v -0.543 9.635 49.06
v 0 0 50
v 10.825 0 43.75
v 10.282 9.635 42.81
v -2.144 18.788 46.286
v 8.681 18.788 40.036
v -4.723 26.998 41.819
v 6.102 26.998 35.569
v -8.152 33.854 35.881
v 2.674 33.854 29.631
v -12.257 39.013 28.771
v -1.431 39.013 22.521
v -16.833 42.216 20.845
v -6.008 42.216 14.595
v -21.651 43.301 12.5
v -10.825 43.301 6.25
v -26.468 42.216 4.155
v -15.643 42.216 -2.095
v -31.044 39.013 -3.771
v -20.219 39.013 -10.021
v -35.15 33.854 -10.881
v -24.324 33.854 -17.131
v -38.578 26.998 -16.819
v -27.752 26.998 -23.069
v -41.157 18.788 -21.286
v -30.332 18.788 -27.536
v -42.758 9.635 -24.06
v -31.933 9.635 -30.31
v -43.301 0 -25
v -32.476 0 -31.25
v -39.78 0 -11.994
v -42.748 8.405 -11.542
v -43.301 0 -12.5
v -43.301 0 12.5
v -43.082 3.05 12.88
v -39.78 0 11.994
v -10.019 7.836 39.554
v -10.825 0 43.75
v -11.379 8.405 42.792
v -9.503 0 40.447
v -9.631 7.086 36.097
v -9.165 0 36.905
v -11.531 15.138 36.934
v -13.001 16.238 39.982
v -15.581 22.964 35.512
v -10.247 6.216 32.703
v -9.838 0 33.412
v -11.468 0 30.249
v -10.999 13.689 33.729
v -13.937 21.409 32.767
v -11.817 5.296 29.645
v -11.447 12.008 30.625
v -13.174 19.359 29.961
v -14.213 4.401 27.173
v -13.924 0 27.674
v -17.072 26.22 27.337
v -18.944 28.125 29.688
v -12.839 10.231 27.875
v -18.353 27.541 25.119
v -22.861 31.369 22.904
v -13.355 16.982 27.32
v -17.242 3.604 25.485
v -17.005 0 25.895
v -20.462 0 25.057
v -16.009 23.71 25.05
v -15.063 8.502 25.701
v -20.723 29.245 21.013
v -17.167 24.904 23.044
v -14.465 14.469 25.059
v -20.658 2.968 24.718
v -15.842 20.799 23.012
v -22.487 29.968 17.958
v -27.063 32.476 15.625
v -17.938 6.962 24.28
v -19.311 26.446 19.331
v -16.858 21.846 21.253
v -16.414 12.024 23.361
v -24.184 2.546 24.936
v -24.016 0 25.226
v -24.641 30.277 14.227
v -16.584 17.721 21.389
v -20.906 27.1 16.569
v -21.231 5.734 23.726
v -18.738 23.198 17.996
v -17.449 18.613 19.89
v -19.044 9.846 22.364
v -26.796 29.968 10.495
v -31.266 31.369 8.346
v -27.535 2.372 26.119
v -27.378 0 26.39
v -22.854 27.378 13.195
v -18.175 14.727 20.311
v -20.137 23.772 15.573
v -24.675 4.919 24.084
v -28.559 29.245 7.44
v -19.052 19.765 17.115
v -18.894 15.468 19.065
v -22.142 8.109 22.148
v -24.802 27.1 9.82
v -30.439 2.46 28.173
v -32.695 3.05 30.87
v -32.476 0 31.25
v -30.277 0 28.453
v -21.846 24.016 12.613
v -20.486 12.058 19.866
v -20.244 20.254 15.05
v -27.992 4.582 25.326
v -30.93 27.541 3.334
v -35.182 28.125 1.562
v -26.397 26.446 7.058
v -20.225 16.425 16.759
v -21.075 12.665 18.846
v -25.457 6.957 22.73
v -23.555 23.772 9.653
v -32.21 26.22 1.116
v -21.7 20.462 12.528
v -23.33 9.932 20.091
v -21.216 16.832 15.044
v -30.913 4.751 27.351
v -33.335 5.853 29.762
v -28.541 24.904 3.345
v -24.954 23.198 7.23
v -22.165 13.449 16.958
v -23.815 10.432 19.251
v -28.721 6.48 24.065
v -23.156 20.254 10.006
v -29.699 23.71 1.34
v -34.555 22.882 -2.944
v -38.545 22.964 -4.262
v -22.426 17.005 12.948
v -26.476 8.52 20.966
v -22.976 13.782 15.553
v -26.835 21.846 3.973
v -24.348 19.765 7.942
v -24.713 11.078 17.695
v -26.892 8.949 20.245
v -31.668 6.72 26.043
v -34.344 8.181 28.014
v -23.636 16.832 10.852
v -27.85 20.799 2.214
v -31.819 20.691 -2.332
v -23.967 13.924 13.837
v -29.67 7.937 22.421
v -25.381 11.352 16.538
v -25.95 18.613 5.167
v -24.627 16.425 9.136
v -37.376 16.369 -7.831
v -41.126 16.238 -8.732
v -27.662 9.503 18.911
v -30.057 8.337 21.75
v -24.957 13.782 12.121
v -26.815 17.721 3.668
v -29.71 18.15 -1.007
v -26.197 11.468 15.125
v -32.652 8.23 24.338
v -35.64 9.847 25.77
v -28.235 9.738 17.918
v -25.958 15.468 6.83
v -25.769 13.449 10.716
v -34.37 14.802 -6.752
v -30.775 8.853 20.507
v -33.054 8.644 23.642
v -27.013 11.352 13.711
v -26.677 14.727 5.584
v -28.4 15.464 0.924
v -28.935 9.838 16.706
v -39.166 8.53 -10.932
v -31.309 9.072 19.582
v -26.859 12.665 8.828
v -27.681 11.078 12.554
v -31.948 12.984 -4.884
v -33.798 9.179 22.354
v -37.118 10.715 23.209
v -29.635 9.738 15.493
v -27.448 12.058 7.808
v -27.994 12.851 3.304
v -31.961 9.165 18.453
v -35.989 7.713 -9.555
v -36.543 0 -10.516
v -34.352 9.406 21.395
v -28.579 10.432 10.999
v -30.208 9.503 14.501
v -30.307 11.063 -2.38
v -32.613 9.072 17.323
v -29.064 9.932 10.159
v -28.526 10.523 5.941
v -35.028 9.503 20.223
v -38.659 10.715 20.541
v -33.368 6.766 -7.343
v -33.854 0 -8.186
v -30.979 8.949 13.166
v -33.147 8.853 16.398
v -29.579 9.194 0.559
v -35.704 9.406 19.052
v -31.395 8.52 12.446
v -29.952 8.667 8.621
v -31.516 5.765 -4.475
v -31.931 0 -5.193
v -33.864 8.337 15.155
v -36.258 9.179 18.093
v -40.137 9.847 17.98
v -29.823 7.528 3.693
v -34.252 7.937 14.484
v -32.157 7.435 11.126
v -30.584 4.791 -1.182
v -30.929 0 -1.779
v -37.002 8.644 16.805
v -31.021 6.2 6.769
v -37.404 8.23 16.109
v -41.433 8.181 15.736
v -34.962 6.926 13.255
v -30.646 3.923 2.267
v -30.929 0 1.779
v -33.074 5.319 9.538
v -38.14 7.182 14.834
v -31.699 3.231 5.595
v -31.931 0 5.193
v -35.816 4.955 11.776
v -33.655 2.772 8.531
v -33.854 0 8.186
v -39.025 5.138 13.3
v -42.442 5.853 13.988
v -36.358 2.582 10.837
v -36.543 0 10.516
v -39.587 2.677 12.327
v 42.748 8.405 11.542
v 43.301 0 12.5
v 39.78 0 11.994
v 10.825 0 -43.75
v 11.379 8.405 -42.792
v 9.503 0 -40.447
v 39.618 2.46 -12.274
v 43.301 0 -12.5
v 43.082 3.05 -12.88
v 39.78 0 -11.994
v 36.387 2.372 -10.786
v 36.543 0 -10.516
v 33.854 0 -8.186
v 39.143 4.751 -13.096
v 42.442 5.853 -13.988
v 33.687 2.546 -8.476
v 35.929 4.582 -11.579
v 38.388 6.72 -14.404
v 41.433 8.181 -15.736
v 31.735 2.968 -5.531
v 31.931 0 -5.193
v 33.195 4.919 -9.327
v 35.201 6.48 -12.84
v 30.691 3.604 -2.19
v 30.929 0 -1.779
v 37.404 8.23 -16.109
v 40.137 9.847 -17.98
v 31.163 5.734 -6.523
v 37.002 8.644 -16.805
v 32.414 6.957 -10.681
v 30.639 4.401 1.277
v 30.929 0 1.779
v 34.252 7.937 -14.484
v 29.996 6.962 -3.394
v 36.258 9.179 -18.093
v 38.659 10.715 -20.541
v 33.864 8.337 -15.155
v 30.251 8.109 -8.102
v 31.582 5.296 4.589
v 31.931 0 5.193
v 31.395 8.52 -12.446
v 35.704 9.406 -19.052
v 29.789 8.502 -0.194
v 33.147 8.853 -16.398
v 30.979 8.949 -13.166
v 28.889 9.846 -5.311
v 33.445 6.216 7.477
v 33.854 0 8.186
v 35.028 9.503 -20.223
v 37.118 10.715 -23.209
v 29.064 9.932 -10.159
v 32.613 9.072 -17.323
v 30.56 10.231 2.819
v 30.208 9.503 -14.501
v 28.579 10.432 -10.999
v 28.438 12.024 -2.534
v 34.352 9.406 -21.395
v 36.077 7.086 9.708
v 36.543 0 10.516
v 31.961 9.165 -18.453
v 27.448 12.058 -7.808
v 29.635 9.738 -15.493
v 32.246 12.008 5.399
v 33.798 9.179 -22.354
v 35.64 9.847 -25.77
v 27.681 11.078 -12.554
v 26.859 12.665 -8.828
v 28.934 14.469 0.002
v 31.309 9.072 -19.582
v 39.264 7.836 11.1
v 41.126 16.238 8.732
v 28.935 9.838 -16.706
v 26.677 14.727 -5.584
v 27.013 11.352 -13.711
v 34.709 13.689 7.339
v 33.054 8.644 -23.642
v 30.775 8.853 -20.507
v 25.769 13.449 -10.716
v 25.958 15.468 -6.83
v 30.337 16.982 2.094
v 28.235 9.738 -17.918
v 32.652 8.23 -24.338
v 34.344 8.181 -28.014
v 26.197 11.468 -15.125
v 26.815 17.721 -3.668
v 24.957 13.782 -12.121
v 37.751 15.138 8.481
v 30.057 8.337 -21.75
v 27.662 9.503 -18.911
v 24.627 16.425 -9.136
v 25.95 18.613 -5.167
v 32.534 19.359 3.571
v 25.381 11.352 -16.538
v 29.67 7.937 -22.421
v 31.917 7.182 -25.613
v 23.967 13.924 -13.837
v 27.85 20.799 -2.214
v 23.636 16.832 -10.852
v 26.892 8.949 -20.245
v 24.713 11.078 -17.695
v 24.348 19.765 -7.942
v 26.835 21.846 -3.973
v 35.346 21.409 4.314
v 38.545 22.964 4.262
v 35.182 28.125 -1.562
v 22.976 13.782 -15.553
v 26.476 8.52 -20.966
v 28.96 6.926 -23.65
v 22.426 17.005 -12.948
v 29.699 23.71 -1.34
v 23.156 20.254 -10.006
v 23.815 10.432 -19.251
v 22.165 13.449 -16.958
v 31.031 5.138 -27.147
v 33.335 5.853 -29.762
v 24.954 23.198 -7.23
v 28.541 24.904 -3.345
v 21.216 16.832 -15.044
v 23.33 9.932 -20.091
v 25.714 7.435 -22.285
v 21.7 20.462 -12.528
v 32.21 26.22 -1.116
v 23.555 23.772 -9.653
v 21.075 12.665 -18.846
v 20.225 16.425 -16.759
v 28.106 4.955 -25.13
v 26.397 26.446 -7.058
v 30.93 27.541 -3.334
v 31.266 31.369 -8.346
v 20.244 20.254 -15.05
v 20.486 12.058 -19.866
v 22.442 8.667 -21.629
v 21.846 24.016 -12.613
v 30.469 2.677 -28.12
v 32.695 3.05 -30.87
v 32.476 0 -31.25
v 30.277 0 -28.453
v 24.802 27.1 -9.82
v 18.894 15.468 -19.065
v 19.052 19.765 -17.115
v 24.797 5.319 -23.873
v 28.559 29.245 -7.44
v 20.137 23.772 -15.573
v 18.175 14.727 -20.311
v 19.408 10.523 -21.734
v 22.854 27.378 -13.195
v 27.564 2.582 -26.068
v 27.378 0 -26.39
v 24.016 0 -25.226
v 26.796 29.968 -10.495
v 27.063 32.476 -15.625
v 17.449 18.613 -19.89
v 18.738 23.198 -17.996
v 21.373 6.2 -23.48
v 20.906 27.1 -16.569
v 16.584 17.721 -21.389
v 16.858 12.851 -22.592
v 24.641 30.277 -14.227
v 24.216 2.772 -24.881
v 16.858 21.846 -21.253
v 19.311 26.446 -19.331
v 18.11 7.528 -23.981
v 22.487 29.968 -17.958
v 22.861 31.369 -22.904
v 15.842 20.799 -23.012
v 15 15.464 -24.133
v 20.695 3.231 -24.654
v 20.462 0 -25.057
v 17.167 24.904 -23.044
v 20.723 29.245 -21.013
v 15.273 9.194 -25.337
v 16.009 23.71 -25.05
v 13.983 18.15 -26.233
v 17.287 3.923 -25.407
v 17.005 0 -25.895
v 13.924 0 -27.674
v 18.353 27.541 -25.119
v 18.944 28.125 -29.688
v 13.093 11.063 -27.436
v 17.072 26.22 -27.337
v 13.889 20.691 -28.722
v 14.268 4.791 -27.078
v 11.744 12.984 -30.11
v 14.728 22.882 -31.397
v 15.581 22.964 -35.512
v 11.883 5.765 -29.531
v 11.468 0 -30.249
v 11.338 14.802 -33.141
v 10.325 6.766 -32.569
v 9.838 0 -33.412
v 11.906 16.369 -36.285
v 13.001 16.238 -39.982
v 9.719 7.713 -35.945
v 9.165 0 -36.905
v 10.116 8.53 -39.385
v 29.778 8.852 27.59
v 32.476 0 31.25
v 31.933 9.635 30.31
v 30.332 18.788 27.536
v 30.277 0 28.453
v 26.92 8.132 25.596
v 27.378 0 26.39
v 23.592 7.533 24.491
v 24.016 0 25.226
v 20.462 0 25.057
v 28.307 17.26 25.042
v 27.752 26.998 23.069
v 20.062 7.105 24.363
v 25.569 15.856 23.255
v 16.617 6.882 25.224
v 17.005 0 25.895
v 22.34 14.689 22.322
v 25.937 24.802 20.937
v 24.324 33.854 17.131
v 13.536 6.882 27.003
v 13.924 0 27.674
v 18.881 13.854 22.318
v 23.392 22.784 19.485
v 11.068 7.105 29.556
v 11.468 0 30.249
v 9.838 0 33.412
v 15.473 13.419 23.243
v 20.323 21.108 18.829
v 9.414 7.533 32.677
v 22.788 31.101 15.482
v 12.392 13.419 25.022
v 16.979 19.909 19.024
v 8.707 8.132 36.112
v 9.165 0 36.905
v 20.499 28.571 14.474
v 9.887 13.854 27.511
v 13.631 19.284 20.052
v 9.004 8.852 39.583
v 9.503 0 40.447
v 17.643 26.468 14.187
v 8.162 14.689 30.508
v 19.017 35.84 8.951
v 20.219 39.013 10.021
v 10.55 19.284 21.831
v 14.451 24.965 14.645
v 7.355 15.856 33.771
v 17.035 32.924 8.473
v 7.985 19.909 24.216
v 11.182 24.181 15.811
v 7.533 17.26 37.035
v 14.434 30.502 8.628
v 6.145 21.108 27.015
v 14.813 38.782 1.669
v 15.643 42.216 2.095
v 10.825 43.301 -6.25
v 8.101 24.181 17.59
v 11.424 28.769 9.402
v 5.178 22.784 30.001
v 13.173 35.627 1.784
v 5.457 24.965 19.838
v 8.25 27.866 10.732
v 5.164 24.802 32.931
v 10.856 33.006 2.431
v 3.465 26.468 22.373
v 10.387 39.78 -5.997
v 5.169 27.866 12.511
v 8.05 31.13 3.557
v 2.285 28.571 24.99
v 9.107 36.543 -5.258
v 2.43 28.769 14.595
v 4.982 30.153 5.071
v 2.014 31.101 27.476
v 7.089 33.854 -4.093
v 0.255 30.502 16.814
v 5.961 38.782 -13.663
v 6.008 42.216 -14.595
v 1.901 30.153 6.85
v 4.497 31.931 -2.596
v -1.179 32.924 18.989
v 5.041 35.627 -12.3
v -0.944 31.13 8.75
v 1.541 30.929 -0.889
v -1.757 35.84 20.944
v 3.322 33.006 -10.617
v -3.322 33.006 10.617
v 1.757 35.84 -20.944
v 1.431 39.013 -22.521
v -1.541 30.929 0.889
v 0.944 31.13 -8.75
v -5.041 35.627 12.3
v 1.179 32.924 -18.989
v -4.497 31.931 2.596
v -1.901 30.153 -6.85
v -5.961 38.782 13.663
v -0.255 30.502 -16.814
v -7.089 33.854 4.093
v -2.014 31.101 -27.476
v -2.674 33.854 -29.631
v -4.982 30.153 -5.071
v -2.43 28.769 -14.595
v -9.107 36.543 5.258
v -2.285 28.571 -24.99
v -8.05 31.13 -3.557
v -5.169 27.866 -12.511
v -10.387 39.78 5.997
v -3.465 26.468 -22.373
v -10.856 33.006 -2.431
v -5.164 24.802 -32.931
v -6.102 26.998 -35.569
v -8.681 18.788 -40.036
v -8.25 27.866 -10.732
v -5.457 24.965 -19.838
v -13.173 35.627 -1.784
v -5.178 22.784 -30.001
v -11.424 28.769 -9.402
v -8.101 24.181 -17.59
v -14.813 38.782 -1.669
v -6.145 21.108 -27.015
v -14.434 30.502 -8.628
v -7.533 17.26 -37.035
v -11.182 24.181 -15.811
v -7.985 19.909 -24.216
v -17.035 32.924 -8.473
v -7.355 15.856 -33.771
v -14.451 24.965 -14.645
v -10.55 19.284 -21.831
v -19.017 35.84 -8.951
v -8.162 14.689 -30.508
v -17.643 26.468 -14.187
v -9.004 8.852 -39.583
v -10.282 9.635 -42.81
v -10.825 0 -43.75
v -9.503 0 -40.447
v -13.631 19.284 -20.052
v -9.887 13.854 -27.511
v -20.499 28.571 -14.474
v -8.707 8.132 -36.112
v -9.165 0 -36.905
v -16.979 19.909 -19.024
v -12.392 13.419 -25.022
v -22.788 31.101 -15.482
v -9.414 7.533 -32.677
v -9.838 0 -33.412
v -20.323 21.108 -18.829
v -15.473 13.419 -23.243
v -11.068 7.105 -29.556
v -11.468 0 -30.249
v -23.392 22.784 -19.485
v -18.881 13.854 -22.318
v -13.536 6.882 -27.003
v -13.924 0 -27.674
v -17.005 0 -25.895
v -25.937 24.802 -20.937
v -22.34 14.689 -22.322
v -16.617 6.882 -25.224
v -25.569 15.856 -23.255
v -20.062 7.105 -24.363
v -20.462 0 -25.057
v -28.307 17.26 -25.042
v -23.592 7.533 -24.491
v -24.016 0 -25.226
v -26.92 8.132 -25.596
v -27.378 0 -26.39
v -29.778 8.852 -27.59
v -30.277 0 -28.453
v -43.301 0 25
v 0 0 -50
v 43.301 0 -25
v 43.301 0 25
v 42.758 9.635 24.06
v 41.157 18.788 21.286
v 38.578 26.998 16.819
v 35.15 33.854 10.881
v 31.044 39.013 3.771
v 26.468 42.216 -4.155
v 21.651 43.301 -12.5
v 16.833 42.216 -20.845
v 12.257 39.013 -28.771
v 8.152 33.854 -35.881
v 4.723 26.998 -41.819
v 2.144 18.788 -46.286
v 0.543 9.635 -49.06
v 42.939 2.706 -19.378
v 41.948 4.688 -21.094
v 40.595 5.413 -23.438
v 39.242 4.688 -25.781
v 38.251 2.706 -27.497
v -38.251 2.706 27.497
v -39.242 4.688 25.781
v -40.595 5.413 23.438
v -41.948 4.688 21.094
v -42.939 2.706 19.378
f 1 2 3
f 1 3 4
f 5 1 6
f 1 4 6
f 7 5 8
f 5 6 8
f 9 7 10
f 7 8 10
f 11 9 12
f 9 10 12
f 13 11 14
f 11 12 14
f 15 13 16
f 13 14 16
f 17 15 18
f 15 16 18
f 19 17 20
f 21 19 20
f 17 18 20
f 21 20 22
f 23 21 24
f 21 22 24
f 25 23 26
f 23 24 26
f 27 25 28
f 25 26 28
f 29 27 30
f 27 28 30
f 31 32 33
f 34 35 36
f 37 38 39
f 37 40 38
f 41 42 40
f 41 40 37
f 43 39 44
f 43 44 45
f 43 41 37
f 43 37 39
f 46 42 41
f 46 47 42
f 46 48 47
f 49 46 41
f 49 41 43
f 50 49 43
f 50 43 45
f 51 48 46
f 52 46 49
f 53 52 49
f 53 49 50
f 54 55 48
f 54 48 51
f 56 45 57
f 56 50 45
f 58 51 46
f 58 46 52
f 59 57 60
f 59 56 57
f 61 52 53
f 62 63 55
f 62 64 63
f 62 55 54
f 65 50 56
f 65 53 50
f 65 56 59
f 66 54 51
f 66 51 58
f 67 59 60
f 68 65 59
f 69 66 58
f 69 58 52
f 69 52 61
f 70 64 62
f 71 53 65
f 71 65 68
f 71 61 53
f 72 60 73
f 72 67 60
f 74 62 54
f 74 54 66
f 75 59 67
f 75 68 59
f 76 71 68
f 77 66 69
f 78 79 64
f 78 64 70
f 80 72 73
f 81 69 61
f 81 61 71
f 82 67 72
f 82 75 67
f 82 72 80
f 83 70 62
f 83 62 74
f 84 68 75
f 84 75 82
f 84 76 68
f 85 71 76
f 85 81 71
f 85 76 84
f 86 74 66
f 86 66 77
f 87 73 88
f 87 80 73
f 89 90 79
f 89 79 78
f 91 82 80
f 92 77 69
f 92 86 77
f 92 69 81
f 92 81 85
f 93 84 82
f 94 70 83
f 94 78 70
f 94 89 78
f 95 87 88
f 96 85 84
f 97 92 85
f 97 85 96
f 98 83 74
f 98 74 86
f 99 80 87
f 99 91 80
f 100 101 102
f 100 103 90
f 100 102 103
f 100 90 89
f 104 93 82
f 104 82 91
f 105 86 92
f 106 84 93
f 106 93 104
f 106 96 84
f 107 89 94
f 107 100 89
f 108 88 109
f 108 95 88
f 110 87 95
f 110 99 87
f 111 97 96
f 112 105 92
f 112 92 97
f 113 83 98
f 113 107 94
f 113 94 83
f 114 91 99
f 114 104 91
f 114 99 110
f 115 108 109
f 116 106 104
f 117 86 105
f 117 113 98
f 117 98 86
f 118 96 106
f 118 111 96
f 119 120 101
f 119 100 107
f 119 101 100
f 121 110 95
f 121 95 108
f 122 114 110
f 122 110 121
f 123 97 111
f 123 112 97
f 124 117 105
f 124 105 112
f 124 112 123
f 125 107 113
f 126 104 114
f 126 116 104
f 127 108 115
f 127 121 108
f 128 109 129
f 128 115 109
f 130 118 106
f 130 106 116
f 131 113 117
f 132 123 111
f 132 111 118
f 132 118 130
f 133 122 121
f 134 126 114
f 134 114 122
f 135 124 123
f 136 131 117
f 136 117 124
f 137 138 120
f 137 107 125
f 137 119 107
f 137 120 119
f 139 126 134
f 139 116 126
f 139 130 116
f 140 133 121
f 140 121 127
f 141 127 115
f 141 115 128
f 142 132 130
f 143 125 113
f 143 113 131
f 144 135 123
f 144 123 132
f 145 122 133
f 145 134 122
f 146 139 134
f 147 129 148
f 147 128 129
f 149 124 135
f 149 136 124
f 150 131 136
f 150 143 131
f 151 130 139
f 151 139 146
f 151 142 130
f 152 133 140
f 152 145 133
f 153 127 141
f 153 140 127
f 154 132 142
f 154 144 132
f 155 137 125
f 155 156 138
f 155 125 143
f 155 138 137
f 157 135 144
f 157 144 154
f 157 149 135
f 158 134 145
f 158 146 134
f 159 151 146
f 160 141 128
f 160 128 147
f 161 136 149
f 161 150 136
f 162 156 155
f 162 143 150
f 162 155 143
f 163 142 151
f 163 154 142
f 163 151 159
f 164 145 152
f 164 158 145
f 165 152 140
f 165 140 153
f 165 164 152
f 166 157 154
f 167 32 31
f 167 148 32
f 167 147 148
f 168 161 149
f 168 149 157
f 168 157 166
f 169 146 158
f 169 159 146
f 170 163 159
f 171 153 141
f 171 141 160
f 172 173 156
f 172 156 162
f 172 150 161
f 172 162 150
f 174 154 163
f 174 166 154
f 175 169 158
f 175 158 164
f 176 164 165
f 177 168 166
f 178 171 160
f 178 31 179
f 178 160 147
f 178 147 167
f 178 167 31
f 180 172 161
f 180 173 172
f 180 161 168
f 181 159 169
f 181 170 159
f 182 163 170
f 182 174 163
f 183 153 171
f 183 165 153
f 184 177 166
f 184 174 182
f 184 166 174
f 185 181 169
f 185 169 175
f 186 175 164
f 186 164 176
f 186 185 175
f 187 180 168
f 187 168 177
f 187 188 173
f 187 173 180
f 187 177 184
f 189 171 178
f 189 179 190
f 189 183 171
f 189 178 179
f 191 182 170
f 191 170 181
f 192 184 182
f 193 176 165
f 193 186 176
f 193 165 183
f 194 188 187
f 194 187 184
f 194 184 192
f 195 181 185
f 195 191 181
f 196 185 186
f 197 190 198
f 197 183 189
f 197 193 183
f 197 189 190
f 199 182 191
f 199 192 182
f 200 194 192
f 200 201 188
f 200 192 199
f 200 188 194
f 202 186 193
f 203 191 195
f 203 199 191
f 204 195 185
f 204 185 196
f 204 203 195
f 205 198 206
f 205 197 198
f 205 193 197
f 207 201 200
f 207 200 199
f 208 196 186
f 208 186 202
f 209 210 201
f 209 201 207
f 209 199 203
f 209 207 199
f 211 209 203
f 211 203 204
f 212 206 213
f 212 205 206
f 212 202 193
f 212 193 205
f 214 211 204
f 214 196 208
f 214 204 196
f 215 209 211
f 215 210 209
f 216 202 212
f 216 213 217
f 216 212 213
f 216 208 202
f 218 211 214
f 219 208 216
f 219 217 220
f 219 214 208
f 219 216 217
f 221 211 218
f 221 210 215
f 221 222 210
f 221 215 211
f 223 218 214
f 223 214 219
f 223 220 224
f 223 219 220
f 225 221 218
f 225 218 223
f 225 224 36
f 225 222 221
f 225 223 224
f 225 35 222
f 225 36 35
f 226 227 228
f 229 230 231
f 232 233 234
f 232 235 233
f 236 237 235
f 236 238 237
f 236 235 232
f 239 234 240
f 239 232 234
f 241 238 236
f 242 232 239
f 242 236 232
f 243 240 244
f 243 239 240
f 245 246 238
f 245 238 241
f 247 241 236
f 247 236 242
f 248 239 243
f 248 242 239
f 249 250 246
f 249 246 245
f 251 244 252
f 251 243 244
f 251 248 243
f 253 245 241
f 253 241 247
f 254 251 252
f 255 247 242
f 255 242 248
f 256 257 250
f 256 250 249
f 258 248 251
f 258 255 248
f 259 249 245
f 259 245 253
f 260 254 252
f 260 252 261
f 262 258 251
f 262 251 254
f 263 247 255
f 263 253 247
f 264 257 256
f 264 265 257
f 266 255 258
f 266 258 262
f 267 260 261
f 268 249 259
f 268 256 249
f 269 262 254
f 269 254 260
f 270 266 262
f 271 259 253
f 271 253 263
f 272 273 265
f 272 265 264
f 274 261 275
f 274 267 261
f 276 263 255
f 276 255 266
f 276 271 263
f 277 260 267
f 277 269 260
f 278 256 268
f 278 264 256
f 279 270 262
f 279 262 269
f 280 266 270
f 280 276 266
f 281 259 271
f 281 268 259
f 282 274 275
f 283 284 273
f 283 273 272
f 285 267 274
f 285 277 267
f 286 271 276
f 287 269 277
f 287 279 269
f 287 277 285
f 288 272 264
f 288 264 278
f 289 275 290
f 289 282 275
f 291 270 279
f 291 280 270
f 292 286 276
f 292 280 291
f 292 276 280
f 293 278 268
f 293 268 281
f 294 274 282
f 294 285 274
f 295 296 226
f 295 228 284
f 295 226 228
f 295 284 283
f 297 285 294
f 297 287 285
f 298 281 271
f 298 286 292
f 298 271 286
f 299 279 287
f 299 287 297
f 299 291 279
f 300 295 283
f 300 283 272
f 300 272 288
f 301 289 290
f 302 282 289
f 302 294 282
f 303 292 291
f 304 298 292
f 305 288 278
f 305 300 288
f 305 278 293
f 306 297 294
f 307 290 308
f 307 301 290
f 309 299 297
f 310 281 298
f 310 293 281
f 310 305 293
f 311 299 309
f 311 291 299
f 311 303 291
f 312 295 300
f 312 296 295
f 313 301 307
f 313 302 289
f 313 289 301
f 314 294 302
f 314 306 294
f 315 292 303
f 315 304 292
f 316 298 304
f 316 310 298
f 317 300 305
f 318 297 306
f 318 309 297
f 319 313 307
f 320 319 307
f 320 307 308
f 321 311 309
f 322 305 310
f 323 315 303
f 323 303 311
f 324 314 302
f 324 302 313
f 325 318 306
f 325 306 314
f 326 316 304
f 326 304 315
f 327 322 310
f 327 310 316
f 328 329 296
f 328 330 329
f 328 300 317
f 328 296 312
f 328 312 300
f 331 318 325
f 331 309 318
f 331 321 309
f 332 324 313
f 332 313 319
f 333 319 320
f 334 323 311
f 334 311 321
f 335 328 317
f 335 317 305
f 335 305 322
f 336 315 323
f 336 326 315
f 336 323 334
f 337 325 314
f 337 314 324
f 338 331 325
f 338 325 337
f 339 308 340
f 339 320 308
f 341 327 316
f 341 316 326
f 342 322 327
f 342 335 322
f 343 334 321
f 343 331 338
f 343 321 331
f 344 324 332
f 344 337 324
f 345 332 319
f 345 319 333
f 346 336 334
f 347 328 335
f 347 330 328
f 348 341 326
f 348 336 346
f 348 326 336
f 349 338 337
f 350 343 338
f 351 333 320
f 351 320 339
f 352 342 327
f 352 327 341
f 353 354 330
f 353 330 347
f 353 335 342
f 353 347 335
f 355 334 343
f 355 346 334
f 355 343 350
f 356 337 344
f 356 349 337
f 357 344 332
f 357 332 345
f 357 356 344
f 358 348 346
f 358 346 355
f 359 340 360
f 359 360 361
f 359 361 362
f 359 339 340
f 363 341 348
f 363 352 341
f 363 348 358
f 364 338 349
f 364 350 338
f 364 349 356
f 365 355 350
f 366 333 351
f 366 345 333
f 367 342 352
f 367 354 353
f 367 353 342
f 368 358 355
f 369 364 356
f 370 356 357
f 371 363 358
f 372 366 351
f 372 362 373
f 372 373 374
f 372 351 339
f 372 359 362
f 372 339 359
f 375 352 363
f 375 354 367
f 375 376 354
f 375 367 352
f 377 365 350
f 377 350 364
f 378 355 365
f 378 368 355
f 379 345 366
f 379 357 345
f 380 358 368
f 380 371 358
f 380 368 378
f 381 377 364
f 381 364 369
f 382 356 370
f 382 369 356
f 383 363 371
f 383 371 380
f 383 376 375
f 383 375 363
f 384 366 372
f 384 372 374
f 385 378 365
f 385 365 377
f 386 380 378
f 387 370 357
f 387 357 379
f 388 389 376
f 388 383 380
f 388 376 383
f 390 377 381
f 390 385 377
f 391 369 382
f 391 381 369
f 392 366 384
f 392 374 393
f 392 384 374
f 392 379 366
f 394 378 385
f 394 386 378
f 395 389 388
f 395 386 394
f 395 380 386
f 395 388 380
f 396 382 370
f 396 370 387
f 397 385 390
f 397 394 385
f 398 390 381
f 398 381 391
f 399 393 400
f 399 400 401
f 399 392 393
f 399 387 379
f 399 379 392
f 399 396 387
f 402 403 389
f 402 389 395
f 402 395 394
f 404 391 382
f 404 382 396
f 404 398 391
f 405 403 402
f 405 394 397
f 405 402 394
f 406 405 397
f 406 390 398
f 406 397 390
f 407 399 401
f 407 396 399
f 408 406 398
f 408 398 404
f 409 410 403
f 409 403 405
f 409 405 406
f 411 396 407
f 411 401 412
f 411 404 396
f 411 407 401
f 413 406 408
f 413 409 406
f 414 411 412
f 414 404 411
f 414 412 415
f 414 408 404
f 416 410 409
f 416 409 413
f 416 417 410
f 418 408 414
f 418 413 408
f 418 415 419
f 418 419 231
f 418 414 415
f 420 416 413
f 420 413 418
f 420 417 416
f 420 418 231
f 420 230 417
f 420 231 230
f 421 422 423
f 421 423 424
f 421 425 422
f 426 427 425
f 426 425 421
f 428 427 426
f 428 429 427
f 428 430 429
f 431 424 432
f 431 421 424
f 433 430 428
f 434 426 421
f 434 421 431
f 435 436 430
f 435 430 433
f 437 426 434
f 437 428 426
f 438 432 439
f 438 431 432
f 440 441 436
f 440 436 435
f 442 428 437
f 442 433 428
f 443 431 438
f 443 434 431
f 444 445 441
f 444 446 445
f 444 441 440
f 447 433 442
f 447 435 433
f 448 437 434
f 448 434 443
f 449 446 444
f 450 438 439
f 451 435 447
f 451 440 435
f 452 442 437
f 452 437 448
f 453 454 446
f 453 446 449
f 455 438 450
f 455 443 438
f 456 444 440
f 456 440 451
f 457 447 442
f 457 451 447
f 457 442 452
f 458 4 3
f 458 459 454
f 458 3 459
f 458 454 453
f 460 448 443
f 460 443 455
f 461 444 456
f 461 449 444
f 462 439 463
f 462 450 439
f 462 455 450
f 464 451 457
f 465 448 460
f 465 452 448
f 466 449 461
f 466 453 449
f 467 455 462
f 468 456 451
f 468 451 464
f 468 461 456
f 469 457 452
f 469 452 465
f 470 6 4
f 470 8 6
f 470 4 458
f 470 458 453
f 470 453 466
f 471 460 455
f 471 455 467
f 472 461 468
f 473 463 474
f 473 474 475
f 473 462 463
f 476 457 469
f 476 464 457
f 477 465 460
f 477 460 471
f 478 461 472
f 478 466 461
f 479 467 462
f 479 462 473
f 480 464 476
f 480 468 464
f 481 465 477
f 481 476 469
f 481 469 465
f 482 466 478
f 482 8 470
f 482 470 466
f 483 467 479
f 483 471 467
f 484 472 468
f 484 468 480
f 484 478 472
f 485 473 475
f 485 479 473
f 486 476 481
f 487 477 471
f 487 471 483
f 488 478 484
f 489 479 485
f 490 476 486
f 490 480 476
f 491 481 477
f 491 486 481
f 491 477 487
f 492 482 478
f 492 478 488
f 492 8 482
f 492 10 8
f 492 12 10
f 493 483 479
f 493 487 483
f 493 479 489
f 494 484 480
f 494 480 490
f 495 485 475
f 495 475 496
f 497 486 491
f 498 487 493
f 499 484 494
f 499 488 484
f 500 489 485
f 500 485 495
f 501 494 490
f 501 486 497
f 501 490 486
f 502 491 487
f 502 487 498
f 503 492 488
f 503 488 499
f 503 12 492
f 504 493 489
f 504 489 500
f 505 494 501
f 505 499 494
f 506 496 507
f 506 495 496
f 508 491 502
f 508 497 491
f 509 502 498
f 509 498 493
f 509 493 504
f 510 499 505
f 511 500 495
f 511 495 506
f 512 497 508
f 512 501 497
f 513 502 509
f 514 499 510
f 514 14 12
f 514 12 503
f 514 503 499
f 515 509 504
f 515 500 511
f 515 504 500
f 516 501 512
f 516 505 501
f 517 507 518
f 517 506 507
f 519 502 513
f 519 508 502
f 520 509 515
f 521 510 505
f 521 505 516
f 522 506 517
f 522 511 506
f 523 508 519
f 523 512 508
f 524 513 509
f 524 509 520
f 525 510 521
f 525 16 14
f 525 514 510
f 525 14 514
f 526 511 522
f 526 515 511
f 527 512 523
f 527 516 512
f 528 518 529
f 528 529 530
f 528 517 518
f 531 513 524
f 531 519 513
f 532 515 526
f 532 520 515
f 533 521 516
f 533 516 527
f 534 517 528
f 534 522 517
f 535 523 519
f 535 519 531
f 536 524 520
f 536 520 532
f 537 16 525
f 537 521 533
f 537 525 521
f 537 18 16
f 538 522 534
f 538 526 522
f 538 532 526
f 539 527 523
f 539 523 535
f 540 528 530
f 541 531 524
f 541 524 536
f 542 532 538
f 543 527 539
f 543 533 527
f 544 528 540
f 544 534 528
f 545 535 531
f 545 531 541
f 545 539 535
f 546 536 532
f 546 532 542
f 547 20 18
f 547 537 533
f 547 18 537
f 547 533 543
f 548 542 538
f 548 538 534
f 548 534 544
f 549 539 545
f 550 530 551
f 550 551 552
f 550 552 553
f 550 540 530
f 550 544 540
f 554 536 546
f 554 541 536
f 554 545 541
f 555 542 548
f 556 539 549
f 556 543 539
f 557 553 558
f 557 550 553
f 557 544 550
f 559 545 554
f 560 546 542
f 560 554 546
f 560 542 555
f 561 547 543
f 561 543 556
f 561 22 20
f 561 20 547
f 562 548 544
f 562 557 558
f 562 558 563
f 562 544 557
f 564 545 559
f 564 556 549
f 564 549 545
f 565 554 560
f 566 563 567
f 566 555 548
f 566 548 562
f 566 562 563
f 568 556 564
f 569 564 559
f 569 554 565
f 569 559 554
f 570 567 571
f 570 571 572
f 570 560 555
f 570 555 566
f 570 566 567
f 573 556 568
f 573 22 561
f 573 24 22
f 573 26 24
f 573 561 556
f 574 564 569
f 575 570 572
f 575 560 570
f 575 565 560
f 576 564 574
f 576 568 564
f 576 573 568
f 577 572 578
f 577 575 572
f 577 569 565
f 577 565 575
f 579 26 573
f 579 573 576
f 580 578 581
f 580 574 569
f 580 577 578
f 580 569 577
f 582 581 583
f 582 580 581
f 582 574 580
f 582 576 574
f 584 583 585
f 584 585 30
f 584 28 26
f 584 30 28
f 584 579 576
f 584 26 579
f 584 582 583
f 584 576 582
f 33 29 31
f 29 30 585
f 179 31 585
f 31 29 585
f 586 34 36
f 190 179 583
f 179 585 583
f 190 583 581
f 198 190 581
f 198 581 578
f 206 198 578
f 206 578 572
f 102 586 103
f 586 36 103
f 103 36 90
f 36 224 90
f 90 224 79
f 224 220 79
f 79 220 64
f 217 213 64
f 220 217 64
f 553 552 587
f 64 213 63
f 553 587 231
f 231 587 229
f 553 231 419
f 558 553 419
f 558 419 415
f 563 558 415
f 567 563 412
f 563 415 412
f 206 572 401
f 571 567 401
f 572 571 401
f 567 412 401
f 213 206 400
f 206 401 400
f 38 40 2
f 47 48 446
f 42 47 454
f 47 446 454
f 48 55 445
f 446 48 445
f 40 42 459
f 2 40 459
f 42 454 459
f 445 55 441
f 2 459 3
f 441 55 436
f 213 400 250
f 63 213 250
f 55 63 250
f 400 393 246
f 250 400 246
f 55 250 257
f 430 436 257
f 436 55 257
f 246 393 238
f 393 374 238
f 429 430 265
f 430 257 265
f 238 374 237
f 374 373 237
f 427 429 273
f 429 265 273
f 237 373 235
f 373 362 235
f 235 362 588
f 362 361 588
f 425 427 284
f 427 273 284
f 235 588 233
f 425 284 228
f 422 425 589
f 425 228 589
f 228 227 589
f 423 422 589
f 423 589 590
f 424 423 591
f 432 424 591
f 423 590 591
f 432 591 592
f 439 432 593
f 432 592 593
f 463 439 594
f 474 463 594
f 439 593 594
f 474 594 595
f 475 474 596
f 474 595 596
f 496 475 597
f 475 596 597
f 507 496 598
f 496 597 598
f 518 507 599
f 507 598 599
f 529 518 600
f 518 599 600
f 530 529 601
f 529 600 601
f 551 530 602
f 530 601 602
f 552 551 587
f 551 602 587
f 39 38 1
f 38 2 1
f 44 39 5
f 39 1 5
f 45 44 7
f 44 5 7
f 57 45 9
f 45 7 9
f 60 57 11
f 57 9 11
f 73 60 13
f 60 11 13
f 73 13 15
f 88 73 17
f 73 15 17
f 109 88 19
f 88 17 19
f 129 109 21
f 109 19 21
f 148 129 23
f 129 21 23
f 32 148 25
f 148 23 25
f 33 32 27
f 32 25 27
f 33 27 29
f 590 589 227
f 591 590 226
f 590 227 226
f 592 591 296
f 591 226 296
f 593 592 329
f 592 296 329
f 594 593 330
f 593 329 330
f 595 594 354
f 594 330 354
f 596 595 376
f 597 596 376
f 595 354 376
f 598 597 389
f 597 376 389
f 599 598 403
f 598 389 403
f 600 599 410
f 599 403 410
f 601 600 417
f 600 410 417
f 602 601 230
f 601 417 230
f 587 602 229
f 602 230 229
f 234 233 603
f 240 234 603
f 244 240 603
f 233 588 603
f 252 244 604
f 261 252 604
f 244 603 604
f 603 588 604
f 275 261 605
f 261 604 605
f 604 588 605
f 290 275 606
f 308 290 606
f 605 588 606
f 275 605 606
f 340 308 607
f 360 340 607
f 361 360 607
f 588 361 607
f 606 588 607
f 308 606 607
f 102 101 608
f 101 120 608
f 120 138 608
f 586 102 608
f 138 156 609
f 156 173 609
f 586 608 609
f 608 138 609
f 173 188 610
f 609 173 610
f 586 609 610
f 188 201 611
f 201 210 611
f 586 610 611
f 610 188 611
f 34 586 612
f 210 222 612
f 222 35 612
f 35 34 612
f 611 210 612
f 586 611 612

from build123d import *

# Parameters (mm, degrees)
REVOLUTION_ANGLE    = -180
BODY001_ROLL_ANGLE  = -180
BODY001_PITCH_ANGLE = -60


with BuildPart() as part:
    # Sketch → Revolution (revolve)
    with BuildSketch(Plane.XZ):
        with BuildLine():
            Line((43.30127, -25), (43.30127, -12.5))
            ThreePointArc((43.30127, 12.5), (30.80127, 0), (43.30127, -12.5))
            Line((43.30127, 12.5), (43.30127, 25))
            Line((43.30127, 25), (32.475953, 31.25))
            ThreePointArc((10.825318, 43.75), (15.400635, 26.674682), (32.475953, 31.25))
            Line((10.825318, 43.75), (0, 50))
            Line((0, 50), (0, -50))
            Line((0, -50), (10.825318, -43.75))
            ThreePointArc((32.475953, -31.25), (15.400635, -26.674682), (10.825318, -43.75))
            Line((32.475953, -31.25), (43.30127, -25))
        make_face()
    revolve(axis=Axis((0, 0, 0), (0, 0, 1)), revolution_arc=REVOLUTION_ANGLE)


with BuildPart() as part_1:
    # Body001 roll: moved
    add(part.part.rotate(Axis((0, 0, 0), (1, 0, 0)), BODY001_ROLL_ANGLE))


with BuildPart() as part_2:
    # Body001 pitch: moved
    add(part_1.part.rotate(Axis((0, 0, 0), (0, 1, 0)), BODY001_PITCH_ANGLE))


with BuildPart() as part_3:
    # Body001 placement: moved
    add(part_2.part)


solid = part_3.part
